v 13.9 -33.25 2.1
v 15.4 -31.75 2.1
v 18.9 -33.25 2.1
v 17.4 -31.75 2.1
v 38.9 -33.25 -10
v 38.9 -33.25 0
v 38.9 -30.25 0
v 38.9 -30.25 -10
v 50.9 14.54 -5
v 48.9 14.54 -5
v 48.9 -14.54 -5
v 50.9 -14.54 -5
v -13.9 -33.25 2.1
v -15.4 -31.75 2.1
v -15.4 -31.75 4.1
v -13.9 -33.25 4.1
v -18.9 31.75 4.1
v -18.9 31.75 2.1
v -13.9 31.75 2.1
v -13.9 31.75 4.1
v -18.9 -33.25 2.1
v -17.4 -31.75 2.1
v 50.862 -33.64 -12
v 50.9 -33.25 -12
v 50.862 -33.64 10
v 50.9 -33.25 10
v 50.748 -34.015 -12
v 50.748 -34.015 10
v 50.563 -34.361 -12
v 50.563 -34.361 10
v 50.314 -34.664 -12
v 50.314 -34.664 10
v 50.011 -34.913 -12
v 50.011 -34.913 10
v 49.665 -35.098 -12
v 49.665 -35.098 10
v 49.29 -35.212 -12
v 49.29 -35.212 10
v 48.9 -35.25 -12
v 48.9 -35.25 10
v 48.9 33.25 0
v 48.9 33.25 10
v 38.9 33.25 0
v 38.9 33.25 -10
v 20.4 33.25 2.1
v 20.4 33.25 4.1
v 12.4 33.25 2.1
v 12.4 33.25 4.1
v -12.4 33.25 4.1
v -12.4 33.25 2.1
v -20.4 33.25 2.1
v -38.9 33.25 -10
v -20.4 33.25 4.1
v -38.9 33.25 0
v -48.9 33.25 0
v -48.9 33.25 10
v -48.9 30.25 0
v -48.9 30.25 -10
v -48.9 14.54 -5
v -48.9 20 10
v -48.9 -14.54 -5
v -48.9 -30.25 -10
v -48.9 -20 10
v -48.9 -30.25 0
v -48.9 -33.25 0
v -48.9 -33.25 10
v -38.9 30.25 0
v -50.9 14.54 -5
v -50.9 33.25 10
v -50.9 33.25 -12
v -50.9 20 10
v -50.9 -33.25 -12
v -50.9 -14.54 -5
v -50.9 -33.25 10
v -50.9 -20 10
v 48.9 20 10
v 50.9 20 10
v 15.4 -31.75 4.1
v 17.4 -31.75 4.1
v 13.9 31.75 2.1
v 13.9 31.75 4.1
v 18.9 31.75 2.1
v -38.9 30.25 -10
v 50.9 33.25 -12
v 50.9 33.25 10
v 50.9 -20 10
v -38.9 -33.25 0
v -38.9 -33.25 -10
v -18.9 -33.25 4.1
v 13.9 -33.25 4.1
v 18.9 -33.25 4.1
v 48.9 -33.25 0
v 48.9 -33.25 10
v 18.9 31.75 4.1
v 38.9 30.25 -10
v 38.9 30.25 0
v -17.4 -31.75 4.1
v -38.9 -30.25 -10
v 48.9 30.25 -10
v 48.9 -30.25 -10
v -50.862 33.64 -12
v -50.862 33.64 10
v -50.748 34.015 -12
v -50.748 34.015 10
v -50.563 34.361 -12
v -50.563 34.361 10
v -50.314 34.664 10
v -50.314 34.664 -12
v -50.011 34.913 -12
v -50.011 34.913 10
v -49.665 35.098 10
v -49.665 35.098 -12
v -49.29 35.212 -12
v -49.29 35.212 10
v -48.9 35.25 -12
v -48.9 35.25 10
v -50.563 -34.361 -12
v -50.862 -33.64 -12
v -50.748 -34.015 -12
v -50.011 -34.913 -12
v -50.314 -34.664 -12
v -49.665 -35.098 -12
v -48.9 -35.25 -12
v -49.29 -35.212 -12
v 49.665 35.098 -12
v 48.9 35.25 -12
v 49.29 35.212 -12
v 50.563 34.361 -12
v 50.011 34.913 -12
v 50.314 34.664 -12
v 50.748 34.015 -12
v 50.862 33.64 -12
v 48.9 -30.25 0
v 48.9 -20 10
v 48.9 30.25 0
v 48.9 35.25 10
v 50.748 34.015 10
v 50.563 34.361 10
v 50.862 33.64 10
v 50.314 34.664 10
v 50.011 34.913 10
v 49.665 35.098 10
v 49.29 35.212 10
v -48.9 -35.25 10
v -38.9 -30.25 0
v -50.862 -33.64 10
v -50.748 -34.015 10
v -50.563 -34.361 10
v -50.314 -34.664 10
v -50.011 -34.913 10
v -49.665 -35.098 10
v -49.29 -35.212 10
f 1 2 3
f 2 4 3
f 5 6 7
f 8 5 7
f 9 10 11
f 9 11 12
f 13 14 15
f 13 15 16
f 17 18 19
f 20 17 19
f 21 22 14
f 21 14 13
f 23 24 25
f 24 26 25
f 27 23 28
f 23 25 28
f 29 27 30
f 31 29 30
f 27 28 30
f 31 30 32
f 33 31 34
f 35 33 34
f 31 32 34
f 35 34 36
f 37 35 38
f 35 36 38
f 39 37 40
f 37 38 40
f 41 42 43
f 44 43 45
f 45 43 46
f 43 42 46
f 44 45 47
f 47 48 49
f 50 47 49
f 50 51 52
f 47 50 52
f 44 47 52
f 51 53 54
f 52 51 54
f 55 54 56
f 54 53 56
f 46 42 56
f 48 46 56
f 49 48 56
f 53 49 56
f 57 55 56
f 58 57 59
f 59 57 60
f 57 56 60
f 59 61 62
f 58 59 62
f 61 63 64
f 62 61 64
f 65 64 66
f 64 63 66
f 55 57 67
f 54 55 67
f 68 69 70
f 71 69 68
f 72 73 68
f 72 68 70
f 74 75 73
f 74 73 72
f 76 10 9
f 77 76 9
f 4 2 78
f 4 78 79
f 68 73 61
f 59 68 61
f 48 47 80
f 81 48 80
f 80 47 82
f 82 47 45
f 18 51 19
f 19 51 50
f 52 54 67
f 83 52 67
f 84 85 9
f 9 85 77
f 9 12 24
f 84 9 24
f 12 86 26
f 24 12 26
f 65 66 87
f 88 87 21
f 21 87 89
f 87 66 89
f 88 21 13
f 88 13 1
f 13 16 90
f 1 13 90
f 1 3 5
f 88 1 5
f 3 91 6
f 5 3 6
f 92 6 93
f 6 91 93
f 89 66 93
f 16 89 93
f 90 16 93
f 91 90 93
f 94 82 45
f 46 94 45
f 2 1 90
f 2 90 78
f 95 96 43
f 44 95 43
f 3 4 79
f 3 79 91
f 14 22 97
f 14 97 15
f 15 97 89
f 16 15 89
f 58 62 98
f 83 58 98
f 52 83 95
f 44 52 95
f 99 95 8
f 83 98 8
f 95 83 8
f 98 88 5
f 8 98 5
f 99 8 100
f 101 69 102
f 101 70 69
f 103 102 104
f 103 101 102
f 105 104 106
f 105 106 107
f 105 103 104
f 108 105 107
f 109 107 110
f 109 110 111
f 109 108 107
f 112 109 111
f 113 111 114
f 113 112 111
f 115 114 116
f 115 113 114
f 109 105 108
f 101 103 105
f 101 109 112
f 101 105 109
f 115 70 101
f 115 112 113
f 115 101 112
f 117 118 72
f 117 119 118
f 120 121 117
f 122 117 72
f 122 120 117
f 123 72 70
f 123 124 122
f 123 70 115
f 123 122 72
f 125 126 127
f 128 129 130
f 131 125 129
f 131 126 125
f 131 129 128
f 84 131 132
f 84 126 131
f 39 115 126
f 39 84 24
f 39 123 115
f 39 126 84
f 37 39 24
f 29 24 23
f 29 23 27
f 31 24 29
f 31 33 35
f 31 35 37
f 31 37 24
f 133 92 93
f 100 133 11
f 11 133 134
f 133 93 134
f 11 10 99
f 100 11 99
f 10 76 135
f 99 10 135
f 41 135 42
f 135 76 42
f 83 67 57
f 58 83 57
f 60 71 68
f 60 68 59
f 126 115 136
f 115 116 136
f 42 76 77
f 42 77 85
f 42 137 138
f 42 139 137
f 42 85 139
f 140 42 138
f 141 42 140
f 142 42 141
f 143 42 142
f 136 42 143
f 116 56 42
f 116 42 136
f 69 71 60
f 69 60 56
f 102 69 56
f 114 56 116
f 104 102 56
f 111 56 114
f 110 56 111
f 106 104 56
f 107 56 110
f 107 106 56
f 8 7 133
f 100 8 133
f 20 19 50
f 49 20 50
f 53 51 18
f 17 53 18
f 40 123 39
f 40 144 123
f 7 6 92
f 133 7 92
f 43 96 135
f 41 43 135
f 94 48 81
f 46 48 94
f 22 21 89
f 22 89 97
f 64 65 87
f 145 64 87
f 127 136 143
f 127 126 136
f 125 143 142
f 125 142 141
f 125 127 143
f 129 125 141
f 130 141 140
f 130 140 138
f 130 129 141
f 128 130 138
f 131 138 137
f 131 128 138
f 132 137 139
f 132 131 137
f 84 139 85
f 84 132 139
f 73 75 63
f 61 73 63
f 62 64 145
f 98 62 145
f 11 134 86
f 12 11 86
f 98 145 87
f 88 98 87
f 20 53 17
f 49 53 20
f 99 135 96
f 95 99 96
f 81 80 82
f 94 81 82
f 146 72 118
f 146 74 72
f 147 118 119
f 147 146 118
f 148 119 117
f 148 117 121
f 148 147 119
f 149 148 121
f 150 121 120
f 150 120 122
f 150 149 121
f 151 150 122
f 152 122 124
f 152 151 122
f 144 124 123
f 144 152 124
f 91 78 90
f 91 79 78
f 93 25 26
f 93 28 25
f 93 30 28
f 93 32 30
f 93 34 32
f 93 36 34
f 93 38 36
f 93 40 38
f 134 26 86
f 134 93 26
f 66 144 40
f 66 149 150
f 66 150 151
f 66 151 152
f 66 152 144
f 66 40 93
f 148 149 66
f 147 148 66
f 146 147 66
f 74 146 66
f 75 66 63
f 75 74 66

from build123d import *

# Parameters (mm, degrees)
SKETCH1_W                            = 70.5
SKETCH1_H                            = 101.8
SKETCH1_W_2                          = 66.5
SKETCH1_H_2                          = 97.8
BOSS_EXTRUDE1_BOARD_4MM_DEPTH        = 10
SKETCH2_W                            = 101.8
SKETCH2_H                            = 70.5
BOSS_EXTRUDE2_UNDER_10MS_DEPTH       = 10
SKETCH3_W                            = 101.8
SKETCH3_H                            = 70.5
BOSS_EXTRUDE3_BOTTOM_COVER_2MM_DEPTH = 2
SKETCH4_W                            = 5
SKETCH4_H                            = 3.5
BOSS_EXTRUDE4_DEPTH                  = 2
SKETCH5_W                            = 128.386338002
SKETCH5_H                            = 40
CUT_EXTRUDE1_CUT_USB_DEPTH           = 15
CUT_EXTRUDE1_CUT_USB_DRAFT           = -20
FILLET1_R                            = 2
CHAMFER2_START                       = 2.1
CHAMFER2_DEPTH                       = 2
CHAMFER2_2_DEPTH                     = 2


with BuildPart() as part:
    # Sketch1 → Boss-Extrude1-board-4mm (new body)
    with BuildSketch(Plane(origin=(0, 0, 0), x_dir=(0, 1, 0), z_dir=(0, 0, 1))):
        Rectangle(SKETCH1_W, SKETCH1_H)
        Rectangle(SKETCH1_W_2, SKETCH1_H_2, mode=Mode.SUBTRACT)
    extrude(amount=BOSS_EXTRUDE1_BOARD_4MM_DEPTH)

    # Sketch2 → Boss-Extrude2-under-10ms (add)
    with BuildSketch(Plane(origin=(0, 0, 0), x_dir=(1, 0, 0), z_dir=(0, 0, -1))):
        Rectangle(SKETCH2_W, SKETCH2_H)
        Polygon((-48.9, 30.25), (-38.9, 30.25), (-38.9, 33.25), (38.9, 33.25), (38.9, 30.25), (48.9, 30.25), (48.9, -30.25), (38.9, -30.25), (38.9, -33.25), (-38.9, -33.25), (-38.9, -30.25), (-48.9, -30.25), align=None, mode=Mode.SUBTRACT)
    extrude(amount=BOSS_EXTRUDE2_UNDER_10MS_DEPTH)

    # Sketch3 → Boss-Extrude3-bottom-cover-2mm (add)
    with BuildSketch(Plane(origin=(0, 0, -10), x_dir=(1, 0, 0), z_dir=(0, 0, -1))):
        Rectangle(SKETCH3_W, SKETCH3_H)
    extrude(amount=BOSS_EXTRUDE3_BOTTOM_COVER_2MM_DEPTH)

    # Sketch4 → Boss-Extrude4 (add)
    with BuildSketch(Plane.XY.offset(2.1)):
        with Locations((-16.4, 33.5)):
            Rectangle(SKETCH4_W, SKETCH4_H)
        with Locations((-16.4, -33.5)):
            Rectangle(SKETCH4_W, SKETCH4_H)
        with Locations((16.4, -33.5)):
            Rectangle(SKETCH4_W, SKETCH4_H)
        with Locations((16.4, 33.5)):
            Rectangle(SKETCH4_W, SKETCH4_H)
    extrude(amount=BOSS_EXTRUDE4_DEPTH)


with BuildPart() as cut_extrude1_cut_usb_tool:
    # Sketch5 → Cut-Extrude1-cut-usb (with draft: the straight prism first)
    with BuildSketch(Plane.XY.offset(10)):
        Rectangle(SKETCH5_W, SKETCH5_H)
    extrude(amount=-CUT_EXTRUDE1_CUT_USB_DEPTH)
    # Cut-Extrude1-cut-usb: the draft: its side faces are tilted about the plane it starts from
    cut_extrude1_cut_usb_sides = [cut_extrude1_cut_usb_tool.faces().sort_by_distance(p)[0] for p in [
        (0, -20, 2.5),
        (64.193169001, 0, 2.5),
        (0, 20, 2.5),
        (-64.193169001, 0, 2.5),
    ]]
    draft(cut_extrude1_cut_usb_sides, Plane.XY.offset(10), CUT_EXTRUDE1_CUT_USB_DRAFT)


with BuildPart() as part_1:
    add(part.part)

    # Cut-Extrude1-cut-usb: cut by cut_extrude1_cut_usb_tool
    add(cut_extrude1_cut_usb_tool.part, mode=Mode.SUBTRACT)

    # Fillet1
    fillet1_edges = [part_1.edges().sort_by_distance(p)[0] for p in [
        (50.9, -35.25, -1),
        (-50.9, -35.25, -1),
        (-50.9, 35.25, -1),
        (50.9, 35.25, -1),
    ]]
    fillet(fillet1_edges, radius=FILLET1_R)

    # Chamfer2: read off the stored shape, not the designer's step
    # Chamfer2 outline → Chamfer2 (cut)
    with BuildSketch(Plane.XY.offset(CHAMFER2_START)):
        Polygon((-18.9, -31.75), (-18.9, -33.25), (-17.4, -31.75), align=None)
        Polygon((-13.9, -31.75), (-15.4, -31.75), (-13.9, -33.25), align=None)
        Polygon((13.9, -31.75), (13.9, -33.25), (15.4, -31.75), align=None)
        Polygon((18.9, -31.75), (17.4, -31.75), (18.9, -33.25), align=None)
    extrude(amount=CHAMFER2_DEPTH, mode=Mode.SUBTRACT)

    # Chamfer2 2 outline → Chamfer2 2 (add)
    with BuildSketch(Plane.XY.offset(CHAMFER2_START)):
        Polygon((-18.9, 31.75), (-18.9, 33.25), (-20.4, 33.25), align=None)
        Polygon((-13.9, 31.75), (-12.4, 33.25), (-13.9, 33.25), align=None)
        Polygon((20.4, 33.25), (18.9, 33.25), (18.9, 31.75), align=None)
        Polygon((12.4, 33.25), (13.9, 31.75), (13.9, 33.25), align=None)
    extrude(amount=CHAMFER2_2_DEPTH)


solid = part_1.part
